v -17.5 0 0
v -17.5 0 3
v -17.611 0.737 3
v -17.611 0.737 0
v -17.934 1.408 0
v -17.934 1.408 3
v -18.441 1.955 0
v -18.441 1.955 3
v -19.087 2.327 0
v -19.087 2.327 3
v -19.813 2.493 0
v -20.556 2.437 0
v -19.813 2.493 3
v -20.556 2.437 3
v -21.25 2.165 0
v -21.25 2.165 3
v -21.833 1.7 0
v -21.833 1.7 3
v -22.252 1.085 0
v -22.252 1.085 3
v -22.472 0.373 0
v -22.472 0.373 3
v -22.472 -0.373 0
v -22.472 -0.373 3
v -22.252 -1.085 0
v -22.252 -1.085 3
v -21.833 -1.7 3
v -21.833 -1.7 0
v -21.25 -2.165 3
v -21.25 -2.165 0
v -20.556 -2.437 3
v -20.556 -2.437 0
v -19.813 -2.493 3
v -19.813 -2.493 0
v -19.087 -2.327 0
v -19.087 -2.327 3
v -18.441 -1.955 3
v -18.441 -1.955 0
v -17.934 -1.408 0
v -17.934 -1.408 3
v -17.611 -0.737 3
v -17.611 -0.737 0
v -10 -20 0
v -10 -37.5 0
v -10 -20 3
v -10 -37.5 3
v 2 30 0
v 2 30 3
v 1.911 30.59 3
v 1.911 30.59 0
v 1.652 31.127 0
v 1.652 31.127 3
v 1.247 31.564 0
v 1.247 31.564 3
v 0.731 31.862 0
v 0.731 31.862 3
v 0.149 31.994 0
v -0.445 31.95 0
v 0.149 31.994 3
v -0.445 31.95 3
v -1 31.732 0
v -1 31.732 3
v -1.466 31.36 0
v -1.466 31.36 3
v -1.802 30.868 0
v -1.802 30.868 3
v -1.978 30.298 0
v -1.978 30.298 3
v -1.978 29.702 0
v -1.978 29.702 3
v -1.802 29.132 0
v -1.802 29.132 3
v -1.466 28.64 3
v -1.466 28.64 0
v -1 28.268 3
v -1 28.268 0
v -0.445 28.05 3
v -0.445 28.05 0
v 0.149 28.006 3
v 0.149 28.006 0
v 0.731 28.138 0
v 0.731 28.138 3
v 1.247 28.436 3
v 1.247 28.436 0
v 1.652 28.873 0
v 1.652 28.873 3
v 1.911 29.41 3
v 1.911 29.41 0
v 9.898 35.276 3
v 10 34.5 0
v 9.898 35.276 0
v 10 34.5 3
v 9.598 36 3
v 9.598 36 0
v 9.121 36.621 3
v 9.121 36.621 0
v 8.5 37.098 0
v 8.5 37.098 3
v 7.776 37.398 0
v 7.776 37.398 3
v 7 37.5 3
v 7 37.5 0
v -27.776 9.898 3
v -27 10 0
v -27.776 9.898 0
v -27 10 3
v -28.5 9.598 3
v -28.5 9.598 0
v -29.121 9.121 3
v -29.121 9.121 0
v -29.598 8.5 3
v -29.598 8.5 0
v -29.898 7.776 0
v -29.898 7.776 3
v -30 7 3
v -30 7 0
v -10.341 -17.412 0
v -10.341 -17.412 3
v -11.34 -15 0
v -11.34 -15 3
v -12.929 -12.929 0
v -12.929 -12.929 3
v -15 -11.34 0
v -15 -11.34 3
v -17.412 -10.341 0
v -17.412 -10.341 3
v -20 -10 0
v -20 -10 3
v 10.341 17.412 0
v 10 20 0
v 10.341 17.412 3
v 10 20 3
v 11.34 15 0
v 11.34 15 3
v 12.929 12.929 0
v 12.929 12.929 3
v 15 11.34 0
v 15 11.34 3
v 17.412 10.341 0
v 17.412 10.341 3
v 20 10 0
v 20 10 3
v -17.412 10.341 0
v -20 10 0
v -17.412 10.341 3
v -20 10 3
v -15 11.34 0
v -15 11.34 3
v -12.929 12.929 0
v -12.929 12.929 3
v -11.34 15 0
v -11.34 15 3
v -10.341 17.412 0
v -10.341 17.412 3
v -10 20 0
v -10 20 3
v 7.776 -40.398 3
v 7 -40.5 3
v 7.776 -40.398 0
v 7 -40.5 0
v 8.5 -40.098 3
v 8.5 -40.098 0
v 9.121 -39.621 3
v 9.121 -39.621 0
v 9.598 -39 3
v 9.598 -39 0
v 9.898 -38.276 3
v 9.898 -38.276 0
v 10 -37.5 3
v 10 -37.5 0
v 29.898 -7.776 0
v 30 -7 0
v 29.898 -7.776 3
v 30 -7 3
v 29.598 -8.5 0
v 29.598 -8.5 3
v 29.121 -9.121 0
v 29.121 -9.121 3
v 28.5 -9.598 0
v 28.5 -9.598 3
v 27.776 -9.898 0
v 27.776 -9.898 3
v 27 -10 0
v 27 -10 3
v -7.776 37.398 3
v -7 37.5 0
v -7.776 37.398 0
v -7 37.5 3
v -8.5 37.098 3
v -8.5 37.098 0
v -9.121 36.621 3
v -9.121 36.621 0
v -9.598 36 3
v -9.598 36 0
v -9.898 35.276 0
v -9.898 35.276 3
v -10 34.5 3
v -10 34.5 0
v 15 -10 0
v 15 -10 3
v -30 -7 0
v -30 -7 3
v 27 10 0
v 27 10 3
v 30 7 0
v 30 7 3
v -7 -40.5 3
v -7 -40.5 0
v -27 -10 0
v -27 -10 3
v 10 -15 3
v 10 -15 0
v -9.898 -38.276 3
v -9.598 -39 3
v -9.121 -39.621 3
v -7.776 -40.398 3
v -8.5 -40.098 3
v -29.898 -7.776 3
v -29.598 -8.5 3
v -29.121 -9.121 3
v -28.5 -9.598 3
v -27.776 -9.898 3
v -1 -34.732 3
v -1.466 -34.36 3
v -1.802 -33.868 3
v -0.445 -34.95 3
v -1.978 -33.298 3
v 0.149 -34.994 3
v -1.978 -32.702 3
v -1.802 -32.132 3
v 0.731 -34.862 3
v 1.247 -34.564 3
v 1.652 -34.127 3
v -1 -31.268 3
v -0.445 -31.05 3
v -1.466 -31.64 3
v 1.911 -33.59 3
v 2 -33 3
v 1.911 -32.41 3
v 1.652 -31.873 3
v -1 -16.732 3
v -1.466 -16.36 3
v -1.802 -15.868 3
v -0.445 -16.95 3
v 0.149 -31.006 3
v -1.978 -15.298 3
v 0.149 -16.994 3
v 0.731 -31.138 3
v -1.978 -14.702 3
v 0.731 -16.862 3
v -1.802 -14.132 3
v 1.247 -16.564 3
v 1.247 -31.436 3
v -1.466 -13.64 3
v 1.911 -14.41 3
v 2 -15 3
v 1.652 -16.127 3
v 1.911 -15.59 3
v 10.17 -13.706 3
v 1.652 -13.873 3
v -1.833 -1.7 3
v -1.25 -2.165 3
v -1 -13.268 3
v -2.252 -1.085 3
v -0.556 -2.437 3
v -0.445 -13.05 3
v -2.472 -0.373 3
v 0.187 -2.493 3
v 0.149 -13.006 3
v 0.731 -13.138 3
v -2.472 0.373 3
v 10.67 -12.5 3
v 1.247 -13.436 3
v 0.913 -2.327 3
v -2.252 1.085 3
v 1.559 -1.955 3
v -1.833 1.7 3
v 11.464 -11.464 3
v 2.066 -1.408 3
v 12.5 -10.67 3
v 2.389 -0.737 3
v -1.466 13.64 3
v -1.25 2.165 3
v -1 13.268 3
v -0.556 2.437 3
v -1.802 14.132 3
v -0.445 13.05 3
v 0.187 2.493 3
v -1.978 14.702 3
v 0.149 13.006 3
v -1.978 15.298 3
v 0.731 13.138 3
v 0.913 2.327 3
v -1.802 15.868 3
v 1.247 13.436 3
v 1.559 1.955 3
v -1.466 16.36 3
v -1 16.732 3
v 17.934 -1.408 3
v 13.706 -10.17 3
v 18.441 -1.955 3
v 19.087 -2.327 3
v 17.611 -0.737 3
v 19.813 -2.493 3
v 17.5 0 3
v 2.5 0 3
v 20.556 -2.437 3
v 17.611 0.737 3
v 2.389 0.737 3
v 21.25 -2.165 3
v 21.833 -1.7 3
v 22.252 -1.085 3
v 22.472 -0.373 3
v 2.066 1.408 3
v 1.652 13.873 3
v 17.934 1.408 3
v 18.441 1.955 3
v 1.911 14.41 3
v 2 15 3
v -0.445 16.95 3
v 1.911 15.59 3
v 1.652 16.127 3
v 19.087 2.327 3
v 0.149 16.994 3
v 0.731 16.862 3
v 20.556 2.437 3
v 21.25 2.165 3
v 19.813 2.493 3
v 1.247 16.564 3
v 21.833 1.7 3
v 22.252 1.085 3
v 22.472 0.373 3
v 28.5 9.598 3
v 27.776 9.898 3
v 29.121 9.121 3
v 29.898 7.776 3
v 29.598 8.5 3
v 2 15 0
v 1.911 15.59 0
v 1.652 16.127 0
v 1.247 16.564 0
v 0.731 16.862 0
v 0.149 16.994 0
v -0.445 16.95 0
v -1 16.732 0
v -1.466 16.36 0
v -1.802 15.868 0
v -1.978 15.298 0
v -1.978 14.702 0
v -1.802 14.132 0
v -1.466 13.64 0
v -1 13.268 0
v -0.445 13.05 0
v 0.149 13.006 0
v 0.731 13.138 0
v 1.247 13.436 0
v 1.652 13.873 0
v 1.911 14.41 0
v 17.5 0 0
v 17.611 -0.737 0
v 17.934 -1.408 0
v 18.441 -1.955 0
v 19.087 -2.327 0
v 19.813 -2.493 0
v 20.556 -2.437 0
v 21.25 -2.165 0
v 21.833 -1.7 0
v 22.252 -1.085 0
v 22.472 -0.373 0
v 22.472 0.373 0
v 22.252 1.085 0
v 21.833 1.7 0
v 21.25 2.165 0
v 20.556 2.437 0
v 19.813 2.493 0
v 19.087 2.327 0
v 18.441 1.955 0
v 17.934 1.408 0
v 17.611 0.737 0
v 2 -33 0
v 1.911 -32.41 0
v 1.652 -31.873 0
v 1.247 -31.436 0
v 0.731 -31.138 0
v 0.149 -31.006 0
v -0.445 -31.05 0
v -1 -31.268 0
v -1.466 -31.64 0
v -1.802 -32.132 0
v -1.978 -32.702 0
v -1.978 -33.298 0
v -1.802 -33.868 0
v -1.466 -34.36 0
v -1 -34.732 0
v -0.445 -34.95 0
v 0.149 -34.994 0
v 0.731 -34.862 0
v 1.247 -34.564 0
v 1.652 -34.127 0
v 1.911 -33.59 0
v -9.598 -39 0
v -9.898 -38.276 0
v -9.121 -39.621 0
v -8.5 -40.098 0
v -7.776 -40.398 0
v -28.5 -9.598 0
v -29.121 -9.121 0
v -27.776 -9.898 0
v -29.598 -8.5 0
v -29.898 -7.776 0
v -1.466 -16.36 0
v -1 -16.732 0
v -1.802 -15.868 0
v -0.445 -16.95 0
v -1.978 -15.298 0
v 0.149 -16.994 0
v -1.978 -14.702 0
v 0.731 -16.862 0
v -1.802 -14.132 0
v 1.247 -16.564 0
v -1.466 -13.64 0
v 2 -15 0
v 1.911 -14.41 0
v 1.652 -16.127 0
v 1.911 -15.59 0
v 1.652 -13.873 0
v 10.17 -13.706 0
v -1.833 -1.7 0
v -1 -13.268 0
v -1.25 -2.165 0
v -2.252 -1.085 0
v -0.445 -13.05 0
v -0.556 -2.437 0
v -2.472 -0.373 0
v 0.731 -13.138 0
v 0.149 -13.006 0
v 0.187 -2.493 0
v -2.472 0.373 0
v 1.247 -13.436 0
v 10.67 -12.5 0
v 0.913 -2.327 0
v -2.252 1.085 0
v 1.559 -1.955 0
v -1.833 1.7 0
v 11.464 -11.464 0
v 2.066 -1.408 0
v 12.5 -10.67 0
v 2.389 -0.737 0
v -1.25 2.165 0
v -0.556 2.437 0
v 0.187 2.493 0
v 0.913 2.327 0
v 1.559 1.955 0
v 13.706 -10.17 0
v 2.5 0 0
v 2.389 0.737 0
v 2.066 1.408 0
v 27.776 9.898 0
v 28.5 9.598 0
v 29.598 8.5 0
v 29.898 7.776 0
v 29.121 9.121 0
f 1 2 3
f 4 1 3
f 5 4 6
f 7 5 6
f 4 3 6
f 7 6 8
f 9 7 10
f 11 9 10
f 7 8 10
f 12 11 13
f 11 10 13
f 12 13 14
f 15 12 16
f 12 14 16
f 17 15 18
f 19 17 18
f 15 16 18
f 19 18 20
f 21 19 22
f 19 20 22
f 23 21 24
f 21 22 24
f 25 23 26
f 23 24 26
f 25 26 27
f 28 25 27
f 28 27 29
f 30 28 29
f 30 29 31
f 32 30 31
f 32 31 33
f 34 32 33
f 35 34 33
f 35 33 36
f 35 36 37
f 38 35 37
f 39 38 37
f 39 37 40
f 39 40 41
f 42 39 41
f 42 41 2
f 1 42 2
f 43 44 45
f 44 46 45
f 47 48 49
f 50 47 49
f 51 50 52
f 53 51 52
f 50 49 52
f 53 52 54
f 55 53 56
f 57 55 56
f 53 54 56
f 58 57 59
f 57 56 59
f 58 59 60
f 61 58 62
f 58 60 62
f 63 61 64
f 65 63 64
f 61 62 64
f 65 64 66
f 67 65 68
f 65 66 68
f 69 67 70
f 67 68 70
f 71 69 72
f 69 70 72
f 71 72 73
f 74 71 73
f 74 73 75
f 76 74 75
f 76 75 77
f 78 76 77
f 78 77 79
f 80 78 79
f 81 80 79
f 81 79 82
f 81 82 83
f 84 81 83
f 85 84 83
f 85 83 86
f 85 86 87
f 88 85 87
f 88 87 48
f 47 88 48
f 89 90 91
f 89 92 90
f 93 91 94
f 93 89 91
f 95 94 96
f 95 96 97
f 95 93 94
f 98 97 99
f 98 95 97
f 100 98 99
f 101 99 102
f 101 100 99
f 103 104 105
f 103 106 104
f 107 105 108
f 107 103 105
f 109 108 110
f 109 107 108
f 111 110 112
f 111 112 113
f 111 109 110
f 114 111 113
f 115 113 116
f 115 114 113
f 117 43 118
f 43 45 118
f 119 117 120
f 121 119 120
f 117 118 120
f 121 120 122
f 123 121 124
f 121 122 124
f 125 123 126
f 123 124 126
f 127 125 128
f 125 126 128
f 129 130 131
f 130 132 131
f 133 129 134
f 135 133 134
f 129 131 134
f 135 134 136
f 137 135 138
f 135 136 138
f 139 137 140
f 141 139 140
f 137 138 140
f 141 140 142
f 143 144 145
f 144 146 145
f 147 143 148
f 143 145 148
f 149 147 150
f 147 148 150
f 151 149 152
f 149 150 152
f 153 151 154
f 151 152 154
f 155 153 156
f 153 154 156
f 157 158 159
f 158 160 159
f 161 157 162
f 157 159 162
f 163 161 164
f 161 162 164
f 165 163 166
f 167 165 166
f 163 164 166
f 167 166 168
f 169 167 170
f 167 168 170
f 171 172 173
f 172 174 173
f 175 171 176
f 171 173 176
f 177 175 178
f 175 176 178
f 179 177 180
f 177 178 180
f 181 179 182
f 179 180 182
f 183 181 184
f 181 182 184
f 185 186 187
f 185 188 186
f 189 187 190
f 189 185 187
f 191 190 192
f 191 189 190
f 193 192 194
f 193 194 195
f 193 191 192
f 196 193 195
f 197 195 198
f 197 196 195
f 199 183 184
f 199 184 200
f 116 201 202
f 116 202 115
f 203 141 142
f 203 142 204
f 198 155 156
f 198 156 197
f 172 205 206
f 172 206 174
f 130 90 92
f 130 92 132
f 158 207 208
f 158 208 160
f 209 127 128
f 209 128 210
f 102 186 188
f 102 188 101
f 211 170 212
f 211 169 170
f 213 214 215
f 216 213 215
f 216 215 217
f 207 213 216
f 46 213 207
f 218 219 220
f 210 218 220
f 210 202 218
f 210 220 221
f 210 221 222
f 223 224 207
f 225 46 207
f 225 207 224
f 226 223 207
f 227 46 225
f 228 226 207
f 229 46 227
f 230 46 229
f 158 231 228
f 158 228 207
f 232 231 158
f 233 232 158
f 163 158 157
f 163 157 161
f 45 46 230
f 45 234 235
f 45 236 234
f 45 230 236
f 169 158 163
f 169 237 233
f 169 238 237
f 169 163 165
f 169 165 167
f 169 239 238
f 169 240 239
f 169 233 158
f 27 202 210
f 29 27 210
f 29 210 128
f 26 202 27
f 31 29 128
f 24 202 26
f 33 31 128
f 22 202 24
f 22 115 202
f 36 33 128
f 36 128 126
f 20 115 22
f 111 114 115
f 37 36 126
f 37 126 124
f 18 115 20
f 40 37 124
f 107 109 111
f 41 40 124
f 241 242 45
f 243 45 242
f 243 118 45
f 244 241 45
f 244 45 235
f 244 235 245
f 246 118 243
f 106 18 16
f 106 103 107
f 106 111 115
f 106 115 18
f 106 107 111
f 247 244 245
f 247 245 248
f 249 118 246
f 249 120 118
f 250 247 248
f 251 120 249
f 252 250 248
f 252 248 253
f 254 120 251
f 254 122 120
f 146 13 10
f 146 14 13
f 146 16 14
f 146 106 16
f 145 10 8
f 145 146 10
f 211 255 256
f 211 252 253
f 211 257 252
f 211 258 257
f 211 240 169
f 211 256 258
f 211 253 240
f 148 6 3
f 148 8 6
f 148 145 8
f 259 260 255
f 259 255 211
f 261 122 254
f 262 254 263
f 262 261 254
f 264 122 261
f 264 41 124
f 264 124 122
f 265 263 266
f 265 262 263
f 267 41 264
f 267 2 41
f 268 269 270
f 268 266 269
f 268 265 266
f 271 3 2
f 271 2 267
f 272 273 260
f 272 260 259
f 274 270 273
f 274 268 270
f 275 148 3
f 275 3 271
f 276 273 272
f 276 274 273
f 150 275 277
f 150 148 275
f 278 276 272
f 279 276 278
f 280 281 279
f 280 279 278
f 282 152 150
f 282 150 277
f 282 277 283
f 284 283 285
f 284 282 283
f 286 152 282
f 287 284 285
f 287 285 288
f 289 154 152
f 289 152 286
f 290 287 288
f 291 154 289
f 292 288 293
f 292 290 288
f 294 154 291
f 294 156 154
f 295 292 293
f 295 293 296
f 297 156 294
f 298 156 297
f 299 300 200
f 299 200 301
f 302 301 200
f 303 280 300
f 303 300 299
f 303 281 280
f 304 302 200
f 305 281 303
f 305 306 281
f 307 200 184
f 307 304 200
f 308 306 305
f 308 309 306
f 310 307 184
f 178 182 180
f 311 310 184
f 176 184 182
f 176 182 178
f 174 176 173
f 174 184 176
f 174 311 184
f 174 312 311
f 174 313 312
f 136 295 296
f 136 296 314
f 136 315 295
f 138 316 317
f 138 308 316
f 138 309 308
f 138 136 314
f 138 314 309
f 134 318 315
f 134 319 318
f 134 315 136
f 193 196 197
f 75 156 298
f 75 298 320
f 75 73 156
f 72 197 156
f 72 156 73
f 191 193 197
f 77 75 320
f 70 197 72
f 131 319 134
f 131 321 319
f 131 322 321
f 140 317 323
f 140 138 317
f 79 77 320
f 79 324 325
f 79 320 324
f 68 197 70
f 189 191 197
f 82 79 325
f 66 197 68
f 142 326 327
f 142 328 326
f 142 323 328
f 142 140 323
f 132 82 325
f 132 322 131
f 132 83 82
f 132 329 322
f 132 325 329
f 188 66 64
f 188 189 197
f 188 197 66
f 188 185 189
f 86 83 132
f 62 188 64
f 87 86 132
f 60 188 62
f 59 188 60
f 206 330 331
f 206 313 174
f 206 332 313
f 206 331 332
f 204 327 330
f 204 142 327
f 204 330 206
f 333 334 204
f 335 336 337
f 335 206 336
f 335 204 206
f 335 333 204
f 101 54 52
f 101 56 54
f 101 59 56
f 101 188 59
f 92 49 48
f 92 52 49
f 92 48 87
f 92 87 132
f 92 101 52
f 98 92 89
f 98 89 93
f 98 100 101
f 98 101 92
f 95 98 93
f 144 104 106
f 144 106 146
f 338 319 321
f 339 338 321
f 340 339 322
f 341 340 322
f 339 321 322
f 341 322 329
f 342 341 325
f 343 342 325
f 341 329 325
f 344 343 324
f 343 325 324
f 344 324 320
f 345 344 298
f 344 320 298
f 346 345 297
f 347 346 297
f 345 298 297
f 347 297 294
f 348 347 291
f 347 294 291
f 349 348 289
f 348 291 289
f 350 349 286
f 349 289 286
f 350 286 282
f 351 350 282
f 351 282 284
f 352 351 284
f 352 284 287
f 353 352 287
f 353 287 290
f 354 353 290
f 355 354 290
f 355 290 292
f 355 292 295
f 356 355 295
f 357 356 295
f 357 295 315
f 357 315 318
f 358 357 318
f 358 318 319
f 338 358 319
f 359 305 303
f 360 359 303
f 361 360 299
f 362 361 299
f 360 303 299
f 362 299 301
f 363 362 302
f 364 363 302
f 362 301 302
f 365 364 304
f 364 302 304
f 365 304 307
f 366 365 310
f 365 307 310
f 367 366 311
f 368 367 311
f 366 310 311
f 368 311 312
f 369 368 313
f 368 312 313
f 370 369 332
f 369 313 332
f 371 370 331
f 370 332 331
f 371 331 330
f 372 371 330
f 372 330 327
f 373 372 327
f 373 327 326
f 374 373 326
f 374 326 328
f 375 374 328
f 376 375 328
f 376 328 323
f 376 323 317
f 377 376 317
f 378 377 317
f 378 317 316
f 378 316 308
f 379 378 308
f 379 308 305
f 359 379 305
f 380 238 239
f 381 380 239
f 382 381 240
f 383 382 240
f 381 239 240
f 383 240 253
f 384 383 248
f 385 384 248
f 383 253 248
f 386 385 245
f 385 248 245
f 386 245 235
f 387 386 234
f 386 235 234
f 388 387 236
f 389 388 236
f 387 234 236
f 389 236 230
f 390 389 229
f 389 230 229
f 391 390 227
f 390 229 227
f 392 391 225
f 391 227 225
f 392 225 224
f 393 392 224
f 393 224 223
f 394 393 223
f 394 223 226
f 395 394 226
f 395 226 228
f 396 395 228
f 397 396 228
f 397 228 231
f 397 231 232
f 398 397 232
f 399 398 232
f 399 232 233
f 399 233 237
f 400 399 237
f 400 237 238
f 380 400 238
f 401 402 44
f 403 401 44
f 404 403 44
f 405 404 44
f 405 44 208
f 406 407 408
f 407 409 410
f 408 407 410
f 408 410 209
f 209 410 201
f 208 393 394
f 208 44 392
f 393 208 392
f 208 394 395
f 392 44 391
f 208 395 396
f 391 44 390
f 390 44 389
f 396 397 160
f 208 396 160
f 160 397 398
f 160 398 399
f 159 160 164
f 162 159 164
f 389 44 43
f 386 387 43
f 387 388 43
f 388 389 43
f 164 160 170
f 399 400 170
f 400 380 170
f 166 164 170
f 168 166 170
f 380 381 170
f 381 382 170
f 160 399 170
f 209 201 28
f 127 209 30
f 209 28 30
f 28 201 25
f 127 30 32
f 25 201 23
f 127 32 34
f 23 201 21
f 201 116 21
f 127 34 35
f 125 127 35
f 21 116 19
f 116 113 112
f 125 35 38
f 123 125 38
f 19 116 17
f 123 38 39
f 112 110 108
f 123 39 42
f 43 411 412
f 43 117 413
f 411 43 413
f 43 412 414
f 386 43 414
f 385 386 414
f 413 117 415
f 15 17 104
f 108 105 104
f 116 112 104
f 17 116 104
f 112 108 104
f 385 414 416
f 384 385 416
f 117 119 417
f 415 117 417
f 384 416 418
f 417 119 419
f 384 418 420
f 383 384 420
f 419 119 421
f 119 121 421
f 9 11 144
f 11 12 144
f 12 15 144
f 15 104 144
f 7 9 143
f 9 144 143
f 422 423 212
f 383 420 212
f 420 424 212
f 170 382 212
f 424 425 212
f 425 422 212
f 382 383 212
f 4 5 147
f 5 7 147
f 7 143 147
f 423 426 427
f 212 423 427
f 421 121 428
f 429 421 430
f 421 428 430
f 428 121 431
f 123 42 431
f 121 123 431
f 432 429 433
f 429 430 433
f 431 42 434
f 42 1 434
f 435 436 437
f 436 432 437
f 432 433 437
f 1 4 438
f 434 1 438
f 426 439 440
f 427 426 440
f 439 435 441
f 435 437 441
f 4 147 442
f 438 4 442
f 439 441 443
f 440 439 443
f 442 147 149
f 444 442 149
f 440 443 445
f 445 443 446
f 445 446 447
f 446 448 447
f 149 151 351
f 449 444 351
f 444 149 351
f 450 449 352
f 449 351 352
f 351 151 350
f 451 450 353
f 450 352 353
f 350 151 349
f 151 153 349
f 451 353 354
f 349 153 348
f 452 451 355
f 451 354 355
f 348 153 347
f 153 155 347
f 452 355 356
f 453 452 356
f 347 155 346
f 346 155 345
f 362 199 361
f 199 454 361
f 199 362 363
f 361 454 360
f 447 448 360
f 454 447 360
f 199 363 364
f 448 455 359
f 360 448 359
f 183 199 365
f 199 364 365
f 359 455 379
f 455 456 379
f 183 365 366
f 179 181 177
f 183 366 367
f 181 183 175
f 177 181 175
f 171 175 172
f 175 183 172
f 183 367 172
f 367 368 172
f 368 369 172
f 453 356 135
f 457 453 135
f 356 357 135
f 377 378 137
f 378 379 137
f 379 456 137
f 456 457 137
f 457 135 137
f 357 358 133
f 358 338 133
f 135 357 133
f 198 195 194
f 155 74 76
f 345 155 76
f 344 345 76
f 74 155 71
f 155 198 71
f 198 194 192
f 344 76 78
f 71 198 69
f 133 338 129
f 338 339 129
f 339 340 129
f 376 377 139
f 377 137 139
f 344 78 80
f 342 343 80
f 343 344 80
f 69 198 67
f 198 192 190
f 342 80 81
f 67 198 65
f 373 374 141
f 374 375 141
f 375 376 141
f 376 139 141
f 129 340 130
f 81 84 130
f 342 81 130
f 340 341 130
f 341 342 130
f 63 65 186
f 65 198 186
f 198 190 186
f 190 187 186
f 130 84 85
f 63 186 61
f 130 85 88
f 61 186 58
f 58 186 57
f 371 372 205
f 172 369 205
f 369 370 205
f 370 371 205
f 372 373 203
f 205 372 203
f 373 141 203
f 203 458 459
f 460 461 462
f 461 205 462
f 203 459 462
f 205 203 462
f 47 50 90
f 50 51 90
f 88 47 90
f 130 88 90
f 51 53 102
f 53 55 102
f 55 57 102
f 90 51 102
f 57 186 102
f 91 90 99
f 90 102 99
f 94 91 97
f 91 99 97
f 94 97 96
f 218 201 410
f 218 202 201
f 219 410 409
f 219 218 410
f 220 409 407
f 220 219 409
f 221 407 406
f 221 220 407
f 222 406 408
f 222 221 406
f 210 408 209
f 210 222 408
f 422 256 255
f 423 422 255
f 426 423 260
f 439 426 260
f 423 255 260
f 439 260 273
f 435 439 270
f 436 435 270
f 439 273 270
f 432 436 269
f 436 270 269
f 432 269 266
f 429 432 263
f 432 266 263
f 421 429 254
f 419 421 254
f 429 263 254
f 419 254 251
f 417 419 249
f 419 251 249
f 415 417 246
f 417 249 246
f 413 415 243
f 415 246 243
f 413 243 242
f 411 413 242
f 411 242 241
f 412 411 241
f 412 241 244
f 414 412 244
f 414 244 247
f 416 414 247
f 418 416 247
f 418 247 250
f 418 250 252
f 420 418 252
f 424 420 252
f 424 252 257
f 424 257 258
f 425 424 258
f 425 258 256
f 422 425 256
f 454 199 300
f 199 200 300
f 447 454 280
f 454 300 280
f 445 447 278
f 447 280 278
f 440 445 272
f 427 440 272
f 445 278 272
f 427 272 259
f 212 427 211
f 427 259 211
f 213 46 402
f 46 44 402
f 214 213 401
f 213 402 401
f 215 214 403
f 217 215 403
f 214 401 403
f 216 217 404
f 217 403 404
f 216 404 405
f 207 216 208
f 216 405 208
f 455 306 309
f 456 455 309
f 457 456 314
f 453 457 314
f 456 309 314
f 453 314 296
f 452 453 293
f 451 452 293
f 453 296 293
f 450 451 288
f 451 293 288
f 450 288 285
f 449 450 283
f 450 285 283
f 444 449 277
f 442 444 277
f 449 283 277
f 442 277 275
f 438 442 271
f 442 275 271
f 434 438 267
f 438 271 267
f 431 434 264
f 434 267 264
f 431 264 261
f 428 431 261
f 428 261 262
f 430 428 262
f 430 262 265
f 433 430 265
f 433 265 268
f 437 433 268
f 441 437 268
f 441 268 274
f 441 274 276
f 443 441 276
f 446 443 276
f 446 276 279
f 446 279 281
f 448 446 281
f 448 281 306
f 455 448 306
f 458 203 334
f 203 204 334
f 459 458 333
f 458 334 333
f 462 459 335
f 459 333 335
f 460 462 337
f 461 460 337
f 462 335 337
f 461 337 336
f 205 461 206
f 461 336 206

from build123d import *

# Parameters (mm, degrees)
EXTRUDE_1_DEPTH     = 3
SKETCH_3_W          = 20
SKETCH_3_H          = 3
EXTRUDE_2_DEPTH     = 3
FILLET_1_R          = 10
FILLET_2_R          = 3
SKETCH_2_R          = 2
CUT_EXTRUDE_1_DEPTH = 51.490098039
SKETCH_4_R          = 2.5
CUT_EXTRUDE_2_DEPTH = 51.490098039
FILLET_3_R          = 5


with BuildPart() as part:
    # 草图1 → 凸台-拉伸1 (new body)
    with BuildSketch(Plane.XY):
        Polygon((-30, -10), (-30, 10), (-10, 10), (-10, 37.5), (10, 37.5), (10, 10), (30, 10), (30, -10), (10, -10), (10, -37.5), (-10, -37.5), (-10, -10), align=None)
    extrude(amount=EXTRUDE_1_DEPTH)

    # 草图3 → 凸台-拉伸2 (add)
    with BuildSketch(Plane.XY.offset(3)):
        with Locations((0, -39)):
            Rectangle(SKETCH_3_W, SKETCH_3_H)
    extrude(amount=-EXTRUDE_2_DEPTH)

    # 圆角1
    fillet_1_edges = [part.edges().sort_by_distance(p)[0] for p in [
        (-10, 10, 1.5),
        (10, 10, 1.5),
        (-10, -10, 1.5),
    ]]
    fillet(fillet_1_edges, radius=FILLET_1_R)

    # 圆角2
    fillet_2_edges = [part.edges().sort_by_distance(p)[0] for p in [
        (-10, 37.5, 1.5),
        (10, 37.5, 1.5),
        (30, 10, 1.5),
        (30, -10, 1.5),
        (-30, -10, 1.5),
        (-30, 10, 1.5),
        (-10, -40.5, 1.5),
        (10, -40.5, 1.5),
    ]]
    fillet(fillet_2_edges, radius=FILLET_2_R)

    # 草图2 → 切除-拉伸1 (cut, through all)
    with BuildSketch(Plane.XY.offset(3)):
        with Locations((0, 30)):
            Circle(SKETCH_2_R)
        with Locations((0, 15)):
            Circle(SKETCH_2_R)
        with Locations((0, -15)):
            Circle(SKETCH_2_R)
        with Locations((0, -33)):
            Circle(SKETCH_2_R)
    extrude(amount=-CUT_EXTRUDE_1_DEPTH, mode=Mode.SUBTRACT)

    # 草图4 → 切除-拉伸2 (cut, through all)
    with BuildSketch(Plane.XY.offset(3)):
        with Locations((-20, 0)):
            Circle(SKETCH_4_R)
        Circle(SKETCH_4_R)
        with Locations(Location((20, 0, 0), (0, 0, 180))):
            Circle(SKETCH_4_R)
    extrude(amount=-CUT_EXTRUDE_2_DEPTH, mode=Mode.SUBTRACT)

    # 圆角3
    fillet_3_edges = [part.edges().sort_by_distance(p)[0] for p in [
        (10, -10, 1.5),
    ]]
    fillet(fillet_3_edges, radius=FILLET_3_R)


solid = part.part
